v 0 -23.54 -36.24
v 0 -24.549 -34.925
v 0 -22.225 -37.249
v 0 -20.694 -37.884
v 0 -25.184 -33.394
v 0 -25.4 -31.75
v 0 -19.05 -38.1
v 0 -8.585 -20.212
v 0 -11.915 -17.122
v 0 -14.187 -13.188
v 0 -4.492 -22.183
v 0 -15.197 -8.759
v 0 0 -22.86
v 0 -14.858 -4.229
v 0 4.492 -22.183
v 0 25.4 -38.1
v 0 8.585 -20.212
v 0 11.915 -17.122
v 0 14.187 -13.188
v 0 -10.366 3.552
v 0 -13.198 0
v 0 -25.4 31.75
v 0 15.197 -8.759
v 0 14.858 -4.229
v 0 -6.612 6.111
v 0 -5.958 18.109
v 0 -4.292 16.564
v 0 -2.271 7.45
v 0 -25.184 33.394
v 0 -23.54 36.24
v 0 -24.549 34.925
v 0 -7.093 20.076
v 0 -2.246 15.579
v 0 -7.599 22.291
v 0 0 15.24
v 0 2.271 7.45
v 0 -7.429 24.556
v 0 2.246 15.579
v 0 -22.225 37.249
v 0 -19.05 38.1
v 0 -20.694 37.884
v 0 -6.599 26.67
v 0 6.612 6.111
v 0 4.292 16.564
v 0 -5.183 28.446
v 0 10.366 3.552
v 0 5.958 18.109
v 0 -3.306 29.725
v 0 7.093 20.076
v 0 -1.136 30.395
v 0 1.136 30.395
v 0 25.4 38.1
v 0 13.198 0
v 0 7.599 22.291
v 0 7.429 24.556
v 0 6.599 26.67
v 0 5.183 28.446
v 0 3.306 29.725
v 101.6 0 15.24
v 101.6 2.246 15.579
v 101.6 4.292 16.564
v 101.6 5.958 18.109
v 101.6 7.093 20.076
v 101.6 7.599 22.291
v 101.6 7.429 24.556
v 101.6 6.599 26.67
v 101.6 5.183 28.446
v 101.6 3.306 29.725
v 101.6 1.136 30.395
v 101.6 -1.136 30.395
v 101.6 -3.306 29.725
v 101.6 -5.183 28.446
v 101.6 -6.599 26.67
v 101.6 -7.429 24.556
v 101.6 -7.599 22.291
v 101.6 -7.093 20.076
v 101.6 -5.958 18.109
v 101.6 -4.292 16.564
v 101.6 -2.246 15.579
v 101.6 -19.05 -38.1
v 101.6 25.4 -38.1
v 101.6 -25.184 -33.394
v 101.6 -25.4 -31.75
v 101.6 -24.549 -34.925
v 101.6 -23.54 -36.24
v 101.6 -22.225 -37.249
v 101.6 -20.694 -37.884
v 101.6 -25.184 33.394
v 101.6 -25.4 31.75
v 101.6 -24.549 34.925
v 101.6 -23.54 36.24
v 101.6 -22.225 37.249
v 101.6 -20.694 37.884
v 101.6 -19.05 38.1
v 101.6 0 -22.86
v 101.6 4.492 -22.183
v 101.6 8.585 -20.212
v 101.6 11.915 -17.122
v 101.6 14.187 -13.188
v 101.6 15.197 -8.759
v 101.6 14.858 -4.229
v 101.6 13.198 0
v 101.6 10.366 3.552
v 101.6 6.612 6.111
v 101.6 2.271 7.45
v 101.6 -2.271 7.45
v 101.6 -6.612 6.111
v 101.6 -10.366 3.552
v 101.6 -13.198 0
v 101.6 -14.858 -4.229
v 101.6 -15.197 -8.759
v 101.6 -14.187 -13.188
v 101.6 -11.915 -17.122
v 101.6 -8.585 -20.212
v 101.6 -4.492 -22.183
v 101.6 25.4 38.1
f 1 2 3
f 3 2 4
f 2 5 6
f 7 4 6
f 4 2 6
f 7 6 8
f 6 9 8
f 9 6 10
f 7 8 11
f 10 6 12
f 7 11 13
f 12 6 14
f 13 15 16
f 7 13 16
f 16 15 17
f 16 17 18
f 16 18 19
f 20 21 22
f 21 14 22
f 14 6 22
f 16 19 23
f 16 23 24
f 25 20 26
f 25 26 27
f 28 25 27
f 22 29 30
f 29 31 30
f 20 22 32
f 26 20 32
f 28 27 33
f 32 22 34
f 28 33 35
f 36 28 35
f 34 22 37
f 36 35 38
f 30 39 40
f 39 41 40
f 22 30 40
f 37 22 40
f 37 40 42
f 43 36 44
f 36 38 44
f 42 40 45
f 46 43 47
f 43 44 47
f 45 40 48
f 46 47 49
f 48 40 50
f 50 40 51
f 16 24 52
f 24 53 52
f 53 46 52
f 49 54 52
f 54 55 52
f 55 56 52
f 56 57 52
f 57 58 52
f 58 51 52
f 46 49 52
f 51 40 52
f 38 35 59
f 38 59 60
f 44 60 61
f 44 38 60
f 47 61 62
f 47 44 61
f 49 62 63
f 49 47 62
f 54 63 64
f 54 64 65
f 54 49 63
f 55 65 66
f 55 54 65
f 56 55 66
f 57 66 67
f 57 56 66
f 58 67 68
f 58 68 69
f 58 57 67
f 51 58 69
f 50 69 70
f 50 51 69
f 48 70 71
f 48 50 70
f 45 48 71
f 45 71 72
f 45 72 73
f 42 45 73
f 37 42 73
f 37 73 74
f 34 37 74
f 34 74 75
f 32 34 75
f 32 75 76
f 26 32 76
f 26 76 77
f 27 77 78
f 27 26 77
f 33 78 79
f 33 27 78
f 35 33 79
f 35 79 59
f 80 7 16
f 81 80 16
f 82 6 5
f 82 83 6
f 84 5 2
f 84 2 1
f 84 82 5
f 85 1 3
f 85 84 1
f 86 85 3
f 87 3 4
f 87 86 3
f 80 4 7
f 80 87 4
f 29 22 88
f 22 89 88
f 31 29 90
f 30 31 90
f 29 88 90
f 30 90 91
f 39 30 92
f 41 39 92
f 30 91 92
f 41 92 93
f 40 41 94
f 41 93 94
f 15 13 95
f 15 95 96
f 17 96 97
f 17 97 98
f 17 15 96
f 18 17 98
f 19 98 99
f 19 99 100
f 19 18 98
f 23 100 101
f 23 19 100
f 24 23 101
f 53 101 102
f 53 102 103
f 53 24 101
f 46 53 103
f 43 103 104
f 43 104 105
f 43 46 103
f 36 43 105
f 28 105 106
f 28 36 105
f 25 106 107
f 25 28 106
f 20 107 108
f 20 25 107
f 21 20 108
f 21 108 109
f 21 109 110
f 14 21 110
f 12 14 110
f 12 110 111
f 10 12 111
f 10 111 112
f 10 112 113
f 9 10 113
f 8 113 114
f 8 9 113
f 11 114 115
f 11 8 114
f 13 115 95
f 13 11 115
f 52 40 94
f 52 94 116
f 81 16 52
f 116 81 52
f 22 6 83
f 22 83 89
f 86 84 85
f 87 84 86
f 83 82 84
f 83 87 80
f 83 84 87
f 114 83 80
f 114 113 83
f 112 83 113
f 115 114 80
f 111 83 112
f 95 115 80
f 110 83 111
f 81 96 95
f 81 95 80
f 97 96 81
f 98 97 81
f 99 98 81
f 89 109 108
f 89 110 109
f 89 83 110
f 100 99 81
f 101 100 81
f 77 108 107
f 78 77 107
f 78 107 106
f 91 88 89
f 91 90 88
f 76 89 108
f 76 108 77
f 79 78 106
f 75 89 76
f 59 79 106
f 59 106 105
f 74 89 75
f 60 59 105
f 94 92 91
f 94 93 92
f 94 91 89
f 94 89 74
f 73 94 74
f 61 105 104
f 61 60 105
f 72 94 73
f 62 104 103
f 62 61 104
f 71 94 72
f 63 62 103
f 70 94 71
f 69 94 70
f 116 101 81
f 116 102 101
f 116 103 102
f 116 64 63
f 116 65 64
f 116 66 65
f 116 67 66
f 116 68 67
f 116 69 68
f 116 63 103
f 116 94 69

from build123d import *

# Parameters (mm, degrees)
SKETCH1_W           = 50.8
SKETCH1_H           = 76.2
SKETCH1_R           = 15.24
SKETCH1_R_2         = 7.62
BOSS_EXTRUDE1_DEPTH = 101.6
FILLET1_R           = 6.35


with BuildPart() as part:
    # Sketch1 → Boss-Extrude1 (new body)
    with BuildSketch(Plane.YZ):
        Rectangle(SKETCH1_W, SKETCH1_H)
        with Locations(Location((0, -7.62, 0), (0, 0, 270))):
            Circle(SKETCH1_R, mode=Mode.SUBTRACT)
        with Locations(Location((0, 22.86, 0), (0, 0, 270))):
            Circle(SKETCH1_R_2, mode=Mode.SUBTRACT)
    extrude(amount=BOSS_EXTRUDE1_DEPTH)

    # Fillet1
    fillet1_edges = [part.edges().sort_by_distance(p)[0] for p in [
        (50.8, -25.4, 38.1),
        (50.8, -25.4, -38.1),
    ]]
    fillet(fillet1_edges, radius=FILLET1_R)


solid = part.part
